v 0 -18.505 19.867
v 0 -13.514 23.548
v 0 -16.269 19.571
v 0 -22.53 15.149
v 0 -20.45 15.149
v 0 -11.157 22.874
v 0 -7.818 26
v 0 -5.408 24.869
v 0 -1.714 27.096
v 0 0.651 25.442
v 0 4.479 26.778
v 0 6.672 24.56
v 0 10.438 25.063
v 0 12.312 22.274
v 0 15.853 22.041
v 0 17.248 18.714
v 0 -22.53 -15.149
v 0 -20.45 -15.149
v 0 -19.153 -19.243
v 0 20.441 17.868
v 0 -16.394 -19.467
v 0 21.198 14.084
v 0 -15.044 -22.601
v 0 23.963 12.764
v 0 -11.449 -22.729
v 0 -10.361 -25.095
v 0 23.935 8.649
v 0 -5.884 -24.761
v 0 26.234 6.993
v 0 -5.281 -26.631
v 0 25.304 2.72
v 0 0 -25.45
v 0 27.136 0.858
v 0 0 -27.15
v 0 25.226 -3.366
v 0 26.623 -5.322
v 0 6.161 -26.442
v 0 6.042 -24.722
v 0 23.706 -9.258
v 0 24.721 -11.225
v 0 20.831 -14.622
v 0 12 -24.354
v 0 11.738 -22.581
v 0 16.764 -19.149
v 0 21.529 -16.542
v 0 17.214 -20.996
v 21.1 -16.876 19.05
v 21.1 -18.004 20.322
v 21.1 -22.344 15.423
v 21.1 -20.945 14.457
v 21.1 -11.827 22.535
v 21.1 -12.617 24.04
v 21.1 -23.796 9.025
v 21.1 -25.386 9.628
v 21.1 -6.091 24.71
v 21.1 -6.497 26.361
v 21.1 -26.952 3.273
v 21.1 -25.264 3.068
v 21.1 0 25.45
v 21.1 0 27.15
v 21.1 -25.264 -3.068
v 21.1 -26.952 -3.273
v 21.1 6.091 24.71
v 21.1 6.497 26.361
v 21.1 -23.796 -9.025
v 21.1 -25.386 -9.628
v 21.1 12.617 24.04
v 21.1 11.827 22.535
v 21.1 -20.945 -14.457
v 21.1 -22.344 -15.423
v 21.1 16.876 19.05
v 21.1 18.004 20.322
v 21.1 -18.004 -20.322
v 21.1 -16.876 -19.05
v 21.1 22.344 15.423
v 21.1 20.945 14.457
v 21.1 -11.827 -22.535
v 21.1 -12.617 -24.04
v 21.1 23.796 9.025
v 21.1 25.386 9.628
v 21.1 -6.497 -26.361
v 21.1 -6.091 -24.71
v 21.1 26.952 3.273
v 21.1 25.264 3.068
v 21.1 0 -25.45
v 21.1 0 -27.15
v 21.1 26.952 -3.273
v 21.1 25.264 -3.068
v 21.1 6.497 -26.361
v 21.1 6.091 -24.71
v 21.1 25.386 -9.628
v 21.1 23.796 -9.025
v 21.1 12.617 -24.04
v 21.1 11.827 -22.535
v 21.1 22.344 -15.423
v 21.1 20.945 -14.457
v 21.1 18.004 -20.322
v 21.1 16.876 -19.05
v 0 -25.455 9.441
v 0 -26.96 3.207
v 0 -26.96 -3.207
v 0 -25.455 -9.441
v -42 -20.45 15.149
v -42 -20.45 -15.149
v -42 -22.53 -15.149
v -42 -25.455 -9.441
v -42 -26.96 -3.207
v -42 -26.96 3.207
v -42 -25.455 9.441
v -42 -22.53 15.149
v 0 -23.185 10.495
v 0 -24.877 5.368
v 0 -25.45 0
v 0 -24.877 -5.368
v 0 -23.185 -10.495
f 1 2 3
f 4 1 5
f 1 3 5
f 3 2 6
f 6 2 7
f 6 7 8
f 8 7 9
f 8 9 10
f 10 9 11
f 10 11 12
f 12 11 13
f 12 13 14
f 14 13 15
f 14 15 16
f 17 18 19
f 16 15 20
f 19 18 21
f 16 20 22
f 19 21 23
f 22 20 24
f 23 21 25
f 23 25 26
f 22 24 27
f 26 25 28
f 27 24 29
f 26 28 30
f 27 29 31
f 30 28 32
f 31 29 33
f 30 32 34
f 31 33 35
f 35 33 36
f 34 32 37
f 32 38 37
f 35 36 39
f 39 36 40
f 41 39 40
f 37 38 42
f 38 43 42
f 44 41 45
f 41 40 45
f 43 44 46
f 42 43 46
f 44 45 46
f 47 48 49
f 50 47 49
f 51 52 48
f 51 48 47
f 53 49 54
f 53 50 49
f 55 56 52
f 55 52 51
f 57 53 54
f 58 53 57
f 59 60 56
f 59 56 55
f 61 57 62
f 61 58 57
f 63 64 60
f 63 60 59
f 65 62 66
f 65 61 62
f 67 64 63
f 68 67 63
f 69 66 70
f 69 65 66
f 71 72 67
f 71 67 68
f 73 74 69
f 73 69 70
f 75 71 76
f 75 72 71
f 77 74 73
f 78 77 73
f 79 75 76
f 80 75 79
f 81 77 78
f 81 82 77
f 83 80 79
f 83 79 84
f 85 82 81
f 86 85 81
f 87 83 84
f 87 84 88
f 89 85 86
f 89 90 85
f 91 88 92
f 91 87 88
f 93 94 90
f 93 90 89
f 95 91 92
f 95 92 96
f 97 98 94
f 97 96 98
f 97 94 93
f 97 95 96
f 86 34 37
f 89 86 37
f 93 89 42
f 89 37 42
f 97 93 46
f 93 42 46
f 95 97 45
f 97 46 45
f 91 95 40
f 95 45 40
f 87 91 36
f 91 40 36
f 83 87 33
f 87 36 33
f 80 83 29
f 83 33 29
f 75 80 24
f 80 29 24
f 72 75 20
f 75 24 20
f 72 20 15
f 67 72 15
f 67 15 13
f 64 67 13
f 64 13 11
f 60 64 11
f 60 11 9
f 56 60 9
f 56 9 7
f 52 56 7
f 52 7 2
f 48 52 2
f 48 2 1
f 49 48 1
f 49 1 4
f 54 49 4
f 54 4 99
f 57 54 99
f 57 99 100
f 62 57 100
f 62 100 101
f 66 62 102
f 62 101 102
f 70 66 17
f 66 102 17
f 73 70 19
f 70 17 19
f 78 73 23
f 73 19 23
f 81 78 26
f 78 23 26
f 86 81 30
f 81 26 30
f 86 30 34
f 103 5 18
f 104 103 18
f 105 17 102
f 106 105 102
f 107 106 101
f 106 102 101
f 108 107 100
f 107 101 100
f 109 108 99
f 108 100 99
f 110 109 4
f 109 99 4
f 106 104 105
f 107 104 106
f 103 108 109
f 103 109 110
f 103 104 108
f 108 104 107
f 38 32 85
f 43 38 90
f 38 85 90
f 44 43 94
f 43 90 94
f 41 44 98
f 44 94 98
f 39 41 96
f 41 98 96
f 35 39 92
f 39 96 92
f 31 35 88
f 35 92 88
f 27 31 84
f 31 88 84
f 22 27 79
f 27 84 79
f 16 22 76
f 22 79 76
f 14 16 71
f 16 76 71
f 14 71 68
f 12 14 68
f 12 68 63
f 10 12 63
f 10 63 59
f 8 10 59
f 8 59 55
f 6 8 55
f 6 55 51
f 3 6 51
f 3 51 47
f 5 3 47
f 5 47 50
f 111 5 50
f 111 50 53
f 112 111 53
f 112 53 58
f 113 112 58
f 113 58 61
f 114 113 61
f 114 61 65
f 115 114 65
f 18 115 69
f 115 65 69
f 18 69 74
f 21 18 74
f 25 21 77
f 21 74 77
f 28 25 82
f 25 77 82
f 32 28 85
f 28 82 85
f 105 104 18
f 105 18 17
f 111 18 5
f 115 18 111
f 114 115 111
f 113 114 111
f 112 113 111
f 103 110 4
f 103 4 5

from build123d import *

# Parameters (mm, degrees)
SKETCH1_R           = 27.15
BOSS_EXTRUDE1_DEPTH = 21.1
SKETCH2_R           = 25.45
CUT_EXTRUDE1_DEPTH  = 21.1
BOSS_EXTRUDE3_DEPTH = 42


with BuildPart() as part:
    # Sketch1 → Boss-Extrude1 (new body)
    with BuildSketch(Plane(origin=(0, 0, 0), x_dir=(0, 0, -1), z_dir=(1, 0, 0))):
        Circle(SKETCH1_R)
    extrude(amount=BOSS_EXTRUDE1_DEPTH)

    # Sketch2 → Cut-Extrude1 (cut)
    with BuildSketch(Plane(origin=(21.1, 0, 0), x_dir=(0, 0, -1), z_dir=(1, 0, 0))):
        Circle(SKETCH2_R)
    extrude(amount=-CUT_EXTRUDE1_DEPTH, mode=Mode.SUBTRACT)

    # Sketch3 → Boss-Extrude3 (add)
    with BuildSketch(Plane.ZY):
        with BuildLine():
            Line((0, -20.45), (-15.149257408, -20.45))
            Line((-15.149257408, -20.45), (-15.149257408, -22.530479356))
            ThreePointArc((-15.149257408, -22.530479356), (0, -27.15), (15.149257408, -22.530479356))
            Line((15.149257408, -22.530479356), (15.149257408, -20.45))
            Line((15.149257408, -20.45), (0, -20.45))
        make_face()
    extrude(amount=BOSS_EXTRUDE3_DEPTH)


solid = part.part
